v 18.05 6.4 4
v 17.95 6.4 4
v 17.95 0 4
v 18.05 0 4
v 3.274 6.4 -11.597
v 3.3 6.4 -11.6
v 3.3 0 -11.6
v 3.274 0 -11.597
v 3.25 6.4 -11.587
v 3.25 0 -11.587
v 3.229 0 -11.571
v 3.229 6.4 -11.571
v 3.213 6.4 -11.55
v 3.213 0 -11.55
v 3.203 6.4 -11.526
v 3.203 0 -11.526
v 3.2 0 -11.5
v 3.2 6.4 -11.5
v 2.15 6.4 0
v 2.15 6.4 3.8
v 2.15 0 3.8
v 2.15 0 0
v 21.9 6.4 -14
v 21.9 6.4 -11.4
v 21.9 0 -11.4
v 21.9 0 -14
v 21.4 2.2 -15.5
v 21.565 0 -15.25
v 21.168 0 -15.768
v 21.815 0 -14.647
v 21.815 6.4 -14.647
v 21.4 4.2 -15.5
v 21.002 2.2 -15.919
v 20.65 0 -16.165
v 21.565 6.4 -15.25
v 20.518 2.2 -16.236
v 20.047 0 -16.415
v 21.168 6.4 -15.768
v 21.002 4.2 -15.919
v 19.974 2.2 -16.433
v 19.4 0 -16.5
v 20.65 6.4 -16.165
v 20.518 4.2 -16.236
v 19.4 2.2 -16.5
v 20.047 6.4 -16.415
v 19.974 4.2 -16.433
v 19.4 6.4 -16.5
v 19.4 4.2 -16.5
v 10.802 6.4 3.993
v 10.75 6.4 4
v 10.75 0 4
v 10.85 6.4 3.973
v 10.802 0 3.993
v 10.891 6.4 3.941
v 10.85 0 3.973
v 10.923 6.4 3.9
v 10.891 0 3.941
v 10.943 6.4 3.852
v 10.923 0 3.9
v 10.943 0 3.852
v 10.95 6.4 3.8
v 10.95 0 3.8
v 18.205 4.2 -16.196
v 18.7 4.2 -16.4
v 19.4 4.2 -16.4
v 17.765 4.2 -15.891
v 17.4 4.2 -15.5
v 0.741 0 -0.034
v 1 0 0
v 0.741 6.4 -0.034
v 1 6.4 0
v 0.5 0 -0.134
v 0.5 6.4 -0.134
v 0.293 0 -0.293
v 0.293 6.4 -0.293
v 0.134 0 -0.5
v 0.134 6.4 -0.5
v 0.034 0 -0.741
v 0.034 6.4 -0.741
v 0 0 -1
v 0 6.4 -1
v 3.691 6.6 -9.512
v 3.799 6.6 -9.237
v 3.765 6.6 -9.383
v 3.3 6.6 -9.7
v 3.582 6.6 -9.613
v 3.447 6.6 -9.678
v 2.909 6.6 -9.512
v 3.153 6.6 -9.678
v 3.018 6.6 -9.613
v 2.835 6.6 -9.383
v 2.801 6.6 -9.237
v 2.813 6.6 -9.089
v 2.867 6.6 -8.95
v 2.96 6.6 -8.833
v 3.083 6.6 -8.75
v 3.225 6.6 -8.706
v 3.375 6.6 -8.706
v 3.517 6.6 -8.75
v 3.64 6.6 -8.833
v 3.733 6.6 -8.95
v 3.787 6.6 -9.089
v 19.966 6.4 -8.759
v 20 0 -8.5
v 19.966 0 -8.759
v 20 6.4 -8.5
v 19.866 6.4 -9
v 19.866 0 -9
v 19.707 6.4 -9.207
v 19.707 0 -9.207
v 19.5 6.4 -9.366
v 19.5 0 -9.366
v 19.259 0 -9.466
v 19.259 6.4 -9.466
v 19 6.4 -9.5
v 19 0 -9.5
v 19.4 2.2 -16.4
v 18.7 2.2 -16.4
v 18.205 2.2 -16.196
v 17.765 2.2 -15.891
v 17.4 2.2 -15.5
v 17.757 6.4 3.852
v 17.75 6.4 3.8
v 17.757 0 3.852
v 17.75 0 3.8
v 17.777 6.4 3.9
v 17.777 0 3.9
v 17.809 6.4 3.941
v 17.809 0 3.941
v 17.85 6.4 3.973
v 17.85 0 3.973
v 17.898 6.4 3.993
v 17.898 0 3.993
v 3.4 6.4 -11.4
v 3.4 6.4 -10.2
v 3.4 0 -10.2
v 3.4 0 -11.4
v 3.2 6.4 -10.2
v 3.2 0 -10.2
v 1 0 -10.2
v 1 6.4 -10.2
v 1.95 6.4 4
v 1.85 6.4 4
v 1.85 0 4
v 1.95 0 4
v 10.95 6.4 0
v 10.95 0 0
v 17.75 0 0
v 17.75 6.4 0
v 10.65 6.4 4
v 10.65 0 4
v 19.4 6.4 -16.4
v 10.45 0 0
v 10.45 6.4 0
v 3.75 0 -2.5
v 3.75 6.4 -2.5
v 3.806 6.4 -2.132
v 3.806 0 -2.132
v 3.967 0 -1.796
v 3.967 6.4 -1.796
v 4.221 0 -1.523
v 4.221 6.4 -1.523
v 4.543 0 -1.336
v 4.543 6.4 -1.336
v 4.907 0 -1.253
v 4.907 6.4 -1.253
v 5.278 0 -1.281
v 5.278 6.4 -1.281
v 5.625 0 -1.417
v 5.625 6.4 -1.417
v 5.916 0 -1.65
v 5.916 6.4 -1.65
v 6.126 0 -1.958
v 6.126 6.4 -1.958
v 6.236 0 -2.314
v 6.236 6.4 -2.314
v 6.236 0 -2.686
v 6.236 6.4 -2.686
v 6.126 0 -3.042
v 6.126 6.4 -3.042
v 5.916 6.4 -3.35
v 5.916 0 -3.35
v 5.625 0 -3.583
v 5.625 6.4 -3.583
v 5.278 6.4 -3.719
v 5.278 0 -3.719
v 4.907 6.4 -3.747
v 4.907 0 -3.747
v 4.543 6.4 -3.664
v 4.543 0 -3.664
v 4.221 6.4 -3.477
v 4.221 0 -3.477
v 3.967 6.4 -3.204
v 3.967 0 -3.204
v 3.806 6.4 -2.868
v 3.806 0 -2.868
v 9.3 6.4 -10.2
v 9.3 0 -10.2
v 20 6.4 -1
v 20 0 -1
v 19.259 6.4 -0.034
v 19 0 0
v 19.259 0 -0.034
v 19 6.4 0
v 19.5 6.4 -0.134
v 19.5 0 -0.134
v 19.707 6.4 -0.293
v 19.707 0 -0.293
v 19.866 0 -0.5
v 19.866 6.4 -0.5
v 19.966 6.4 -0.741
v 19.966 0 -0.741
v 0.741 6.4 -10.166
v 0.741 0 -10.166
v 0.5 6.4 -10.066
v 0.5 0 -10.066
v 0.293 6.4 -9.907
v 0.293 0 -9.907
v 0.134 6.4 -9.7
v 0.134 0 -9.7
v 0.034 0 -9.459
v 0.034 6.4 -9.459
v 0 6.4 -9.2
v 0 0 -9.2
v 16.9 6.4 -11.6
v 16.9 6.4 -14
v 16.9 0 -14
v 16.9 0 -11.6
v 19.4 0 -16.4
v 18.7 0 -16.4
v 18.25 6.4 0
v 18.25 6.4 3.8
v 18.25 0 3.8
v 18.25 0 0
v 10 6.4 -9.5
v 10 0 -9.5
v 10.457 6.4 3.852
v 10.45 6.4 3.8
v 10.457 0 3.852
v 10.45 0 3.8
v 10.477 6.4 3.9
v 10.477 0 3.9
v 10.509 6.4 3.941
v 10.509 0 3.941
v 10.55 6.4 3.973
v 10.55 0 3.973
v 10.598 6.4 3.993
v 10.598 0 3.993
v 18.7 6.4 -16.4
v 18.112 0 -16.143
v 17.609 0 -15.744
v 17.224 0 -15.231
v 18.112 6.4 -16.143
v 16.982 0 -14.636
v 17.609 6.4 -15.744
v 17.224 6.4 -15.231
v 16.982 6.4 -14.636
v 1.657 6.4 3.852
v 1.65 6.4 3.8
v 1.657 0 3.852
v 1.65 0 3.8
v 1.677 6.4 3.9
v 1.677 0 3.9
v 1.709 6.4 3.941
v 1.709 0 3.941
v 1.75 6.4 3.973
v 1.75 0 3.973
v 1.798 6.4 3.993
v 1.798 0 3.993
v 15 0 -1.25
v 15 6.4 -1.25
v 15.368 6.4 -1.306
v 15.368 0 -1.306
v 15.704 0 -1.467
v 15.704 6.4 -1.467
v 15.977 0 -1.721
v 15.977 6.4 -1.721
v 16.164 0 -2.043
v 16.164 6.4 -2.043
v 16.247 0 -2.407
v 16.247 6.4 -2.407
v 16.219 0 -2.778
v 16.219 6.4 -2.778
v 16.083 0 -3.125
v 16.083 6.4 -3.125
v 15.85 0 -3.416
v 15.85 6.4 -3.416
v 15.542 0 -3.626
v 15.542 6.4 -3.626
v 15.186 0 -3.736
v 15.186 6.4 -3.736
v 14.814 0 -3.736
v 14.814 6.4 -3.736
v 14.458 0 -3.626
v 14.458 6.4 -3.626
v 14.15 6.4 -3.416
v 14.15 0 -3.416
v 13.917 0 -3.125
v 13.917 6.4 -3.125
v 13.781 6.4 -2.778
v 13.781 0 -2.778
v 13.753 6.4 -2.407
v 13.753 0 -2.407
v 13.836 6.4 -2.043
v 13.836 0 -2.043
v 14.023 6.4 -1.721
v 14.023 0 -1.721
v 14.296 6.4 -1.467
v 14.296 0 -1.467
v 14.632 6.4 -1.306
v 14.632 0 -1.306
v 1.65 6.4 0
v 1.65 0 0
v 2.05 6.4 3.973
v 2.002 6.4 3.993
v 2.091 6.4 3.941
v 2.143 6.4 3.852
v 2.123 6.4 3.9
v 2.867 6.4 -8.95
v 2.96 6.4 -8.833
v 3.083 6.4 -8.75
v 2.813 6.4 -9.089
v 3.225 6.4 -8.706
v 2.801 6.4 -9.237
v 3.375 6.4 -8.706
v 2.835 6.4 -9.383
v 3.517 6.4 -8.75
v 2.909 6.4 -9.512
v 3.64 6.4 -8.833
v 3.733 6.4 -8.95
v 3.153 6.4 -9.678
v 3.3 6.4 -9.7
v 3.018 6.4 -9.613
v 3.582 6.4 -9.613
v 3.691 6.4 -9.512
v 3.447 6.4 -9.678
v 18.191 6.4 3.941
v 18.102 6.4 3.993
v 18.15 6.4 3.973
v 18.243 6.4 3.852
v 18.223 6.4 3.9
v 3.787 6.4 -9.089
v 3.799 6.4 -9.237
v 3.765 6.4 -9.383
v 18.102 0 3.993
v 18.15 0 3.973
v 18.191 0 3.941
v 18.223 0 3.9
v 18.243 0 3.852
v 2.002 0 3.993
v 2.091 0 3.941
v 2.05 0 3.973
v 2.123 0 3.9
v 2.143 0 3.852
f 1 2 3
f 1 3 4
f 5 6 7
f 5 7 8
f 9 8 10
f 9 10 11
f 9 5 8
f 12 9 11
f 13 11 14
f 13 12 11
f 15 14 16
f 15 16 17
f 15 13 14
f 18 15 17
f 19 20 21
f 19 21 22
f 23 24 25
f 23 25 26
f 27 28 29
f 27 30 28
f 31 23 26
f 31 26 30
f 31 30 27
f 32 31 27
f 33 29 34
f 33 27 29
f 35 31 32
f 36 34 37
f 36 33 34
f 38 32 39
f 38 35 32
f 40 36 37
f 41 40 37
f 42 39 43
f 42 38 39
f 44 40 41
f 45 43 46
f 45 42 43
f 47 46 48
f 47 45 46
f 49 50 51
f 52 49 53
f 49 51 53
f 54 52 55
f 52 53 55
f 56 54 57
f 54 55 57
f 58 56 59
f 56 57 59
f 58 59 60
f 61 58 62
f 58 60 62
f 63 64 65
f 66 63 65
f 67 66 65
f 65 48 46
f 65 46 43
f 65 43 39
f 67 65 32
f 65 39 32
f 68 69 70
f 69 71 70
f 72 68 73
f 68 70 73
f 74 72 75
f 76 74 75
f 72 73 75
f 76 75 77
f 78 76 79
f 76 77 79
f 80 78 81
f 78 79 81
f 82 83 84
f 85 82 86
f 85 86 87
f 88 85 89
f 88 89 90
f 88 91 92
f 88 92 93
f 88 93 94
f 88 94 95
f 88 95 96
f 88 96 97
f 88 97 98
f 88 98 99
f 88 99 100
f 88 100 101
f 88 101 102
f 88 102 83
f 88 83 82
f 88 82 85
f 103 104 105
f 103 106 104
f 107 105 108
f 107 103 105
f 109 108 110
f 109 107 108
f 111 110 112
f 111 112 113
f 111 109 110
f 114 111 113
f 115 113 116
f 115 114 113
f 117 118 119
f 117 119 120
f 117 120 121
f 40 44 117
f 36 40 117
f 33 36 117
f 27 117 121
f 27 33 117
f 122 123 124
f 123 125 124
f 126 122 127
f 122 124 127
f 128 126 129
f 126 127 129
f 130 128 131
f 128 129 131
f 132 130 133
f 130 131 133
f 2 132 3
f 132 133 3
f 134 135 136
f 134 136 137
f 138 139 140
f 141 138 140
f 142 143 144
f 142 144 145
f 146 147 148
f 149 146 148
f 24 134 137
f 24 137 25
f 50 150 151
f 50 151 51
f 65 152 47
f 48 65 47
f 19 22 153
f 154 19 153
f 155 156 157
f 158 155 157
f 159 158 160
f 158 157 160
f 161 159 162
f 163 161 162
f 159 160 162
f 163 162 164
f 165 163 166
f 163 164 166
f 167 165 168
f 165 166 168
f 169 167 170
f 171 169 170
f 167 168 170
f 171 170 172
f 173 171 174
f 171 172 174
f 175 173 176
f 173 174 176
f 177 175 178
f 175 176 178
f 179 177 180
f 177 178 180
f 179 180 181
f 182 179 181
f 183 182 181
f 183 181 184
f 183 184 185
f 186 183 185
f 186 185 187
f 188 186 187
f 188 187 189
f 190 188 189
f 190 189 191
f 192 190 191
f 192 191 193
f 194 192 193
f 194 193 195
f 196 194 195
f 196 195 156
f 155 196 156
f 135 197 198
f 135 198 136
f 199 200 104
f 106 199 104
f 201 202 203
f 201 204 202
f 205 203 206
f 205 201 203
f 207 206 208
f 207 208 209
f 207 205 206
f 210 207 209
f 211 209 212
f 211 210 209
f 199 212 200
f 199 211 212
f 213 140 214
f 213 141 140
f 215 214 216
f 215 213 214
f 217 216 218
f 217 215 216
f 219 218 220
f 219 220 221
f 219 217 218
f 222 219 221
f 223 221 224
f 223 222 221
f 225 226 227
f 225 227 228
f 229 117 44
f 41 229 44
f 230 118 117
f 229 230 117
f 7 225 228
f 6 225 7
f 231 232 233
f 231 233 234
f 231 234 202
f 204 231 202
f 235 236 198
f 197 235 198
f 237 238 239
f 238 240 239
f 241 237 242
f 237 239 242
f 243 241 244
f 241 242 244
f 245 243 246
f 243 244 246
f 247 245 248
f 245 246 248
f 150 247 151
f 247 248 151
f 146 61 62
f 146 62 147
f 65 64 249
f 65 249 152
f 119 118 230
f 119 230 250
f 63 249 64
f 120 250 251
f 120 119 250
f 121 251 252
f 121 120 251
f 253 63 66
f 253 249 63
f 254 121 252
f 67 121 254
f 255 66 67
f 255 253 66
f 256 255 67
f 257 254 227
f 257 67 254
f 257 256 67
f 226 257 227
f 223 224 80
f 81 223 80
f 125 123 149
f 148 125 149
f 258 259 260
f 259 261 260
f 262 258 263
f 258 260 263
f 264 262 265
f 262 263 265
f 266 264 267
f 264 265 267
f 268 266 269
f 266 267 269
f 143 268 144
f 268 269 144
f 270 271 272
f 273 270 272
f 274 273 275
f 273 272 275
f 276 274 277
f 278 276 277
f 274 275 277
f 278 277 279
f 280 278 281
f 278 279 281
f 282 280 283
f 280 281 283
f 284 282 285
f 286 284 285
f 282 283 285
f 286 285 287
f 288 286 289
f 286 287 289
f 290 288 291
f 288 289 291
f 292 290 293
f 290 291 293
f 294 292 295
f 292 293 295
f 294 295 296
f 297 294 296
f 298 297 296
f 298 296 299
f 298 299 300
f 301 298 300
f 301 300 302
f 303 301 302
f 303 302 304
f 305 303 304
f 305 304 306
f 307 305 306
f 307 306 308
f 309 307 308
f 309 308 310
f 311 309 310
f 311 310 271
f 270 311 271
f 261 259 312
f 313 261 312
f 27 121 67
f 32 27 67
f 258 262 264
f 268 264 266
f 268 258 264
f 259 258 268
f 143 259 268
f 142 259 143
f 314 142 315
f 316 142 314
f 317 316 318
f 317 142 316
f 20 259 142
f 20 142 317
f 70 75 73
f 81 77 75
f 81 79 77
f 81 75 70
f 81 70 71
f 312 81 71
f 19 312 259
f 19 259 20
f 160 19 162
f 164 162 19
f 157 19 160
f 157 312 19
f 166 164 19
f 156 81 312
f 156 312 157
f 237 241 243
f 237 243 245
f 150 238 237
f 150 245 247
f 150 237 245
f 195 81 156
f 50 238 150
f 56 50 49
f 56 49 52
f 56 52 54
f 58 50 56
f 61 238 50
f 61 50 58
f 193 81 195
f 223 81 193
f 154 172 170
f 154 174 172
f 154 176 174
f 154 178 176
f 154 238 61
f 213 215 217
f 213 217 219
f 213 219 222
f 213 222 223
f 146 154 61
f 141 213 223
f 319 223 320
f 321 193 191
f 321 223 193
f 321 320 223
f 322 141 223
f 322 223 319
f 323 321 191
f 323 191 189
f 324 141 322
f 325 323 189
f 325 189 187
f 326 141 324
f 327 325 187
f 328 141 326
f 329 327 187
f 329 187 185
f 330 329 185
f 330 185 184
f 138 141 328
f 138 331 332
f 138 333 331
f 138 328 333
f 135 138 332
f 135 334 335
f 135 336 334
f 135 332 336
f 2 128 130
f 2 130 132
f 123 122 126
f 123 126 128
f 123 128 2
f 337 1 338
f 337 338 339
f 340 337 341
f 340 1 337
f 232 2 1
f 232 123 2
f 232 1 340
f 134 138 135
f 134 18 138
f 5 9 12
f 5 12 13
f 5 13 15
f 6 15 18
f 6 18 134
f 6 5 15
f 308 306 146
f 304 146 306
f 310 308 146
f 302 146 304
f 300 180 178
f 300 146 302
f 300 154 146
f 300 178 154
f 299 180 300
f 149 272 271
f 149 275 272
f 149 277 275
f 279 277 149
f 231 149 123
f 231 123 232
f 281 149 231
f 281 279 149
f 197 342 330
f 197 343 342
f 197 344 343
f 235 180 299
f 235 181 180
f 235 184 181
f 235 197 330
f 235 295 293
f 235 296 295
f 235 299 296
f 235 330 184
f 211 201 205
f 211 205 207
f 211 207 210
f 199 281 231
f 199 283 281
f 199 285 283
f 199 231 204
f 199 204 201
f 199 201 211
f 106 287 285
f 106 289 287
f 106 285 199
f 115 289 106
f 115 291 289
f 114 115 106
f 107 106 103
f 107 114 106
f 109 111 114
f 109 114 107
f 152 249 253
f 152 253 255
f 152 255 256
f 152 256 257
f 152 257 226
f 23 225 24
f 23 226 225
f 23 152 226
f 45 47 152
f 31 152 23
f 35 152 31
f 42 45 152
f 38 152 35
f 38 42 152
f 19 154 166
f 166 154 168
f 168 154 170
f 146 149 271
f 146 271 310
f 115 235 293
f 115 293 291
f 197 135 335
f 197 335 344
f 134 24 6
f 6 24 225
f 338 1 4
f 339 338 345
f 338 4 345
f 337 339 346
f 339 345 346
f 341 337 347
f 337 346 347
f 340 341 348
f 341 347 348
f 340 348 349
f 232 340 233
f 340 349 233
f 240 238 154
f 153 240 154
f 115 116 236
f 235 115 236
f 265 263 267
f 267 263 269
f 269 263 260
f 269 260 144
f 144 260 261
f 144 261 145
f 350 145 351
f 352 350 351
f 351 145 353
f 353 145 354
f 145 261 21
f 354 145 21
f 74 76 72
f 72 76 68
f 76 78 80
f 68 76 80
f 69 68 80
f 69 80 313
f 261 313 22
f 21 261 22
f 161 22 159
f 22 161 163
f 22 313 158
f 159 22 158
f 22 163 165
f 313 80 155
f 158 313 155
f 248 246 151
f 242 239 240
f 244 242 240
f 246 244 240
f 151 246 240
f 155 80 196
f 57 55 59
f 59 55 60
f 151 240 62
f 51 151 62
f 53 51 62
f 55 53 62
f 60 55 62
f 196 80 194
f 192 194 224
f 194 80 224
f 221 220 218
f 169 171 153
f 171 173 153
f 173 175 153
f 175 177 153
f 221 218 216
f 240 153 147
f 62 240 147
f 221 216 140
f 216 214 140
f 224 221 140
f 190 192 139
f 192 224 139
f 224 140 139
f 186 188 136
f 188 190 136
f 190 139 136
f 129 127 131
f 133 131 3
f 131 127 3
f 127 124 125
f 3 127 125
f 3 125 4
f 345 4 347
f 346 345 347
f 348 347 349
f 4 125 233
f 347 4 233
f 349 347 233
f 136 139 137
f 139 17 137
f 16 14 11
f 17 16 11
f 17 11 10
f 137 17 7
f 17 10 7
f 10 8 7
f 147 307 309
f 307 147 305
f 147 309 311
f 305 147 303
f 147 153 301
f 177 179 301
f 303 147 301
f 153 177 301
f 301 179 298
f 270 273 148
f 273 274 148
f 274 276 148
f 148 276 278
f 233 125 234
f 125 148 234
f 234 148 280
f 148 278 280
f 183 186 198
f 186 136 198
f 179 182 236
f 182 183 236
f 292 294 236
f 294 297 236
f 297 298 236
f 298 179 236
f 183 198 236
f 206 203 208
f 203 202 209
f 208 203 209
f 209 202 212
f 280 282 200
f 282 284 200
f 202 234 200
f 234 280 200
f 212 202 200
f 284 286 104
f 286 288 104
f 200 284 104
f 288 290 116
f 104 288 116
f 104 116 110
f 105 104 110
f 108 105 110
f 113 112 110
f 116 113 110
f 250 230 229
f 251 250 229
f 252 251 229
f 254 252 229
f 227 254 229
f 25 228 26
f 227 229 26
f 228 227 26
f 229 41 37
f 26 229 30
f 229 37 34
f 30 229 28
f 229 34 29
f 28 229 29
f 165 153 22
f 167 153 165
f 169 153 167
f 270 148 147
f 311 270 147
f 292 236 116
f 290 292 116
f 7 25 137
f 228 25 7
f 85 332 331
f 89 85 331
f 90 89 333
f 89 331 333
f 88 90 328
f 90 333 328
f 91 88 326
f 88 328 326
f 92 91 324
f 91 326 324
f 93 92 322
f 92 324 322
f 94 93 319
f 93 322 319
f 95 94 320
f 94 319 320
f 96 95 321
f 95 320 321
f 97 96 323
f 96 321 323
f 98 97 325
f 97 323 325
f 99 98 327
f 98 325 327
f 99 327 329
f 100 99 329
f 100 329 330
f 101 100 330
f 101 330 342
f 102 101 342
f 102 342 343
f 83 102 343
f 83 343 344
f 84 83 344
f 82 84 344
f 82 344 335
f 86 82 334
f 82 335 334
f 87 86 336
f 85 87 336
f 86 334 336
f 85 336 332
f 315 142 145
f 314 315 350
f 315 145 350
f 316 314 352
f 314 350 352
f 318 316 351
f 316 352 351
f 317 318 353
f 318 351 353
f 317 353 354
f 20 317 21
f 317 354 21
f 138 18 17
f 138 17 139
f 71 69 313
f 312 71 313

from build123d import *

# Parameters (mm, degrees)
BOSS_EXTRUDE1_DEPTH     = 6.4
FILLET1_R               = 1
SKETCH2_R               = 0.5
BOSS_EXTRUDE2_DEPTH     = 0.2
SKETCH3_W               = 18.5
SKETCH3_H               = 0.1
SKETCH3_W_2             = 0.1
SKETCH3_H_2             = 1.2
BOSS_EXTRUDE3_DEPTH     = 6.4
BOSS_EXTRUDE4_DEPTH     = 6.4
SKETCH5_R               = 1.25
CUT_EXTRUDE1_DEPTH      = 29.157059506
SKETCH6_W               = 0.5
SKETCH6_H               = 4
BOSS_EXTRUDE5_DEPTH     = 6.4
FILLET2_R               = 0.2
CUT_EXTRUDE2_DEPTH      = 10
CUT_EXTRUDE3_DEPTH      = 25.523865927
CUT_EXTRUDE3_DEPTH_BACK = 25.523865927
SKETCH9_W               = 1
SKETCH9_H               = 1


with BuildPart() as part:
    # Sketch1 → Boss-Extrude1 (new body)
    with BuildSketch(Plane(origin=(0, 0, 0), x_dir=(1, 0, 0), z_dir=(0, 1, 0))):
        Polygon((0, 0), (20, 0), (20, 9.5), (10, 9.5), (9.3, 10.2), (0, 10.2), align=None)
    extrude(amount=BOSS_EXTRUDE1_DEPTH)

    # Fillet1
    fillet1_edges = [part.edges().sort_by_distance(p)[0] for p in [
        (0, 3.2, -10.2),
        (20, 3.2, -9.5),
        (20, 3.2, 0),
        (0, 3.2, 0),
    ]]
    fillet(fillet1_edges, radius=FILLET1_R)

    # Sketch2 → Boss-Extrude2 (add)
    with BuildSketch(Plane(origin=(0, 6.4, 0), x_dir=(1, 0, 0), z_dir=(0, 1, 0))):
        with Locations(Location((3.3, 9.2, 0), (0, 0, 90))):
            Circle(SKETCH2_R)
    extrude(amount=BOSS_EXTRUDE2_DEPTH)

    # Sketch3 → Boss-Extrude3 (add)
    with BuildSketch(Plane(origin=(0, 6.4, 0), x_dir=(1, 0, 0), z_dir=(0, 1, 0))):
        with BuildLine():
            ThreePointArc((3.3, 11.6), (3.370710678, 11.570710678), (3.4, 11.5))
            Line((3.4, 11.5), (21.9, 11.5))
            Line((21.9, 11.5), (21.9, 11.6))
            Line((21.9, 11.6), (3.3, 11.6))
        make_face()
        with Locations((12.65, 11.45)):
            Rectangle(SKETCH3_W, SKETCH3_H)
        with BuildLine():
            ThreePointArc((3.4, 11.5), (3.370710678, 11.429289322), (3.3, 11.4))
            Line((3.3, 11.4), (3.4, 11.4))
            Line((3.4, 11.4), (3.4, 11.5))
        make_face()
        with BuildLine():
            ThreePointArc((3.2, 11.5), (3.229289322, 11.429289322), (3.3, 11.4))
            Line((3.3, 11.4), (3.3, 11.5))
            Line((3.3, 11.5), (3.4, 11.5))
            ThreePointArc((3.4, 11.5), (3.370710678, 11.570710678), (3.3, 11.6))
            ThreePointArc((3.3, 11.6), (3.229289322, 11.570710678), (3.2, 11.5))
        make_face()
        with BuildLine():
            Line((3.3, 11.5), (3.3, 11.4))
            ThreePointArc((3.3, 11.4), (3.370710678, 11.429289322), (3.4, 11.5))
            Line((3.4, 11.5), (3.3, 11.5))
        make_face()
        with Locations((3.35, 10.8)):
            Rectangle(SKETCH3_W_2, SKETCH3_H_2)
        with BuildLine():
            Line((3.3, 10.2), (3.3, 11.4))
            ThreePointArc((3.3, 11.4), (3.229289322, 11.429289322), (3.2, 11.5))
            Line((3.2, 11.5), (3.2, 10.2))
            Line((3.2, 10.2), (3.3, 10.2))
        make_face()
    extrude(amount=-BOSS_EXTRUDE3_DEPTH)

    # Sketch4 → Boss-Extrude4 (add)
    with BuildSketch(Plane(origin=(0, 6.4, 0), x_dir=(1, 0, 0), z_dir=(0, 1, 0))):
        with BuildLine():
            Line((20.1, 11.6), (21.9, 11.6))
            Line((21.9, 11.6), (21.9, 14))
            ThreePointArc((21.9, 14), (21.4, 12.5), (20.1, 11.6))
        make_face()
        with BuildLine():
            ThreePointArc((18.7, 11.6), (19.046446609, 11.525126266), (19.4, 11.5))
            Line((19.4, 11.5), (19.4, 11.6))
            Line((19.4, 11.6), (18.7, 11.6))
        make_face()
        with BuildLine():
            Line((19.4, 11.6), (19.4, 11.5))
            ThreePointArc((19.4, 11.5), (19.753553391, 11.525126266), (20.1, 11.6))
            Line((20.1, 11.6), (19.4, 11.6))
        make_face()
        with BuildLine():
            Line((18.7, 11.6), (19.4, 11.6))
            Line((19.4, 11.6), (19.4, 16.5))
            ThreePointArc((19.4, 16.5), (17.632233047, 15.767766953), (16.9, 14))
            ThreePointArc((16.9, 14), (17.4, 12.5), (18.7, 11.6))
        make_face()
        with BuildLine():
            Line((19.4, 16.5), (19.4, 11.6))
            Line((19.4, 11.6), (20.1, 11.6))
            ThreePointArc((20.1, 11.6), (21.4, 12.5), (21.9, 14))
            ThreePointArc((21.9, 14), (21.167766953, 15.767766953), (19.4, 16.5))
        make_face()
        with BuildLine():
            Line((16.9, 11.6), (18.7, 11.6))
            ThreePointArc((18.7, 11.6), (17.4, 12.5), (16.9, 14))
            Line((16.9, 14), (16.9, 11.6))
        make_face()
    extrude(amount=-BOSS_EXTRUDE4_DEPTH)

    # Sketch5 → Cut-Extrude1 (cut, through all)
    with BuildSketch(Plane(origin=(0, 6.4, 0), x_dir=(1, 0, 0), z_dir=(0, 1, 0))):
        with Locations(Location((15, 2.5, 0), (0, 0, 270))):
            Circle(SKETCH5_R)
        with BuildLine():
            ThreePointArc((6.25, 2.5), (5, 3.75), (3.75, 2.5))
            Line((3.75, 2.5), (6.25, 2.5))
        make_face()
        with BuildLine():
            Line((6.25, 2.5), (3.75, 2.5))
            ThreePointArc((3.75, 2.5), (5, 1.25), (6.25, 2.5))
        make_face()
    extrude(amount=-CUT_EXTRUDE1_DEPTH, mode=Mode.SUBTRACT)

    # Sketch6 → Boss-Extrude5 (add)
    with BuildSketch(Plane(origin=(0, 6.4, 0), x_dir=(1, 0, 0), z_dir=(0, 1, 0))):
        with Locations((1.9, -2)):
            Rectangle(SKETCH6_W, SKETCH6_H)
        with Locations((10.7, -2)):
            Rectangle(SKETCH6_W, SKETCH6_H)
        with Locations((18, -2)):
            Rectangle(SKETCH6_W, SKETCH6_H)
    extrude(amount=-BOSS_EXTRUDE5_DEPTH)

    # Fillet2
    fillet2_edges = [part.edges().sort_by_distance(p)[0] for p in [
        (2.15, 3.2, 4),
        (1.65, 3.2, 4),
        (10.45, 3.2, 4),
        (10.95, 3.2, 4),
        (17.75, 3.2, 4),
        (18.25, 3.2, 4),
    ]]
    fillet(fillet2_edges, radius=FILLET2_R)

    # Sketch7 → Cut-Extrude2 (cut)
    with BuildSketch(Plane(origin=(0, 6.4, 0), x_dir=(1, 0, 0), z_dir=(0, 1, 0))):
        with BuildLine():
            ThreePointArc((18.7, 16.4), (19.046446609, 16.474873734), (19.4, 16.5))
            ThreePointArc((19.4, 16.5), (19.753553391, 16.474873734), (20.1, 16.4))
            Line((20.1, 16.4), (20.417508918, 16.4))
            Line((20.417508918, 16.4), (20.417508918, 16.594496766))
            Line((20.417508918, 16.594496766), (18.102606367, 16.594496766))
            Line((18.102606367, 16.594496766), (18.102606367, 16.4))
            Line((18.102606367, 16.4), (18.7, 16.4))
        make_face()
        with BuildLine():
            Line((19.4, 16.4), (19.4, 16.5))
            ThreePointArc((19.4, 16.5), (19.046446609, 16.474873734), (18.7, 16.4))
            Line((18.7, 16.4), (19.4, 16.4))
        make_face()
    extrude(amount=-CUT_EXTRUDE2_DEPTH, mode=Mode.SUBTRACT)

    # Sketch9 → Cut-Extrude3 (cut, two sides: drawn at the far end of the back side and taken through both)
    with BuildSketch(Plane.ZY.offset(-16.9).offset(-CUT_EXTRUDE3_DEPTH_BACK)):
        with Locations((-16, 3.7)):
            Rectangle(SKETCH9_W, SKETCH9_H)
        with Locations((-16, 2.7)):
            Rectangle(SKETCH9_W, SKETCH9_H)
    extrude(amount=CUT_EXTRUDE3_DEPTH + CUT_EXTRUDE3_DEPTH_BACK, mode=Mode.SUBTRACT)


solid = part.part
